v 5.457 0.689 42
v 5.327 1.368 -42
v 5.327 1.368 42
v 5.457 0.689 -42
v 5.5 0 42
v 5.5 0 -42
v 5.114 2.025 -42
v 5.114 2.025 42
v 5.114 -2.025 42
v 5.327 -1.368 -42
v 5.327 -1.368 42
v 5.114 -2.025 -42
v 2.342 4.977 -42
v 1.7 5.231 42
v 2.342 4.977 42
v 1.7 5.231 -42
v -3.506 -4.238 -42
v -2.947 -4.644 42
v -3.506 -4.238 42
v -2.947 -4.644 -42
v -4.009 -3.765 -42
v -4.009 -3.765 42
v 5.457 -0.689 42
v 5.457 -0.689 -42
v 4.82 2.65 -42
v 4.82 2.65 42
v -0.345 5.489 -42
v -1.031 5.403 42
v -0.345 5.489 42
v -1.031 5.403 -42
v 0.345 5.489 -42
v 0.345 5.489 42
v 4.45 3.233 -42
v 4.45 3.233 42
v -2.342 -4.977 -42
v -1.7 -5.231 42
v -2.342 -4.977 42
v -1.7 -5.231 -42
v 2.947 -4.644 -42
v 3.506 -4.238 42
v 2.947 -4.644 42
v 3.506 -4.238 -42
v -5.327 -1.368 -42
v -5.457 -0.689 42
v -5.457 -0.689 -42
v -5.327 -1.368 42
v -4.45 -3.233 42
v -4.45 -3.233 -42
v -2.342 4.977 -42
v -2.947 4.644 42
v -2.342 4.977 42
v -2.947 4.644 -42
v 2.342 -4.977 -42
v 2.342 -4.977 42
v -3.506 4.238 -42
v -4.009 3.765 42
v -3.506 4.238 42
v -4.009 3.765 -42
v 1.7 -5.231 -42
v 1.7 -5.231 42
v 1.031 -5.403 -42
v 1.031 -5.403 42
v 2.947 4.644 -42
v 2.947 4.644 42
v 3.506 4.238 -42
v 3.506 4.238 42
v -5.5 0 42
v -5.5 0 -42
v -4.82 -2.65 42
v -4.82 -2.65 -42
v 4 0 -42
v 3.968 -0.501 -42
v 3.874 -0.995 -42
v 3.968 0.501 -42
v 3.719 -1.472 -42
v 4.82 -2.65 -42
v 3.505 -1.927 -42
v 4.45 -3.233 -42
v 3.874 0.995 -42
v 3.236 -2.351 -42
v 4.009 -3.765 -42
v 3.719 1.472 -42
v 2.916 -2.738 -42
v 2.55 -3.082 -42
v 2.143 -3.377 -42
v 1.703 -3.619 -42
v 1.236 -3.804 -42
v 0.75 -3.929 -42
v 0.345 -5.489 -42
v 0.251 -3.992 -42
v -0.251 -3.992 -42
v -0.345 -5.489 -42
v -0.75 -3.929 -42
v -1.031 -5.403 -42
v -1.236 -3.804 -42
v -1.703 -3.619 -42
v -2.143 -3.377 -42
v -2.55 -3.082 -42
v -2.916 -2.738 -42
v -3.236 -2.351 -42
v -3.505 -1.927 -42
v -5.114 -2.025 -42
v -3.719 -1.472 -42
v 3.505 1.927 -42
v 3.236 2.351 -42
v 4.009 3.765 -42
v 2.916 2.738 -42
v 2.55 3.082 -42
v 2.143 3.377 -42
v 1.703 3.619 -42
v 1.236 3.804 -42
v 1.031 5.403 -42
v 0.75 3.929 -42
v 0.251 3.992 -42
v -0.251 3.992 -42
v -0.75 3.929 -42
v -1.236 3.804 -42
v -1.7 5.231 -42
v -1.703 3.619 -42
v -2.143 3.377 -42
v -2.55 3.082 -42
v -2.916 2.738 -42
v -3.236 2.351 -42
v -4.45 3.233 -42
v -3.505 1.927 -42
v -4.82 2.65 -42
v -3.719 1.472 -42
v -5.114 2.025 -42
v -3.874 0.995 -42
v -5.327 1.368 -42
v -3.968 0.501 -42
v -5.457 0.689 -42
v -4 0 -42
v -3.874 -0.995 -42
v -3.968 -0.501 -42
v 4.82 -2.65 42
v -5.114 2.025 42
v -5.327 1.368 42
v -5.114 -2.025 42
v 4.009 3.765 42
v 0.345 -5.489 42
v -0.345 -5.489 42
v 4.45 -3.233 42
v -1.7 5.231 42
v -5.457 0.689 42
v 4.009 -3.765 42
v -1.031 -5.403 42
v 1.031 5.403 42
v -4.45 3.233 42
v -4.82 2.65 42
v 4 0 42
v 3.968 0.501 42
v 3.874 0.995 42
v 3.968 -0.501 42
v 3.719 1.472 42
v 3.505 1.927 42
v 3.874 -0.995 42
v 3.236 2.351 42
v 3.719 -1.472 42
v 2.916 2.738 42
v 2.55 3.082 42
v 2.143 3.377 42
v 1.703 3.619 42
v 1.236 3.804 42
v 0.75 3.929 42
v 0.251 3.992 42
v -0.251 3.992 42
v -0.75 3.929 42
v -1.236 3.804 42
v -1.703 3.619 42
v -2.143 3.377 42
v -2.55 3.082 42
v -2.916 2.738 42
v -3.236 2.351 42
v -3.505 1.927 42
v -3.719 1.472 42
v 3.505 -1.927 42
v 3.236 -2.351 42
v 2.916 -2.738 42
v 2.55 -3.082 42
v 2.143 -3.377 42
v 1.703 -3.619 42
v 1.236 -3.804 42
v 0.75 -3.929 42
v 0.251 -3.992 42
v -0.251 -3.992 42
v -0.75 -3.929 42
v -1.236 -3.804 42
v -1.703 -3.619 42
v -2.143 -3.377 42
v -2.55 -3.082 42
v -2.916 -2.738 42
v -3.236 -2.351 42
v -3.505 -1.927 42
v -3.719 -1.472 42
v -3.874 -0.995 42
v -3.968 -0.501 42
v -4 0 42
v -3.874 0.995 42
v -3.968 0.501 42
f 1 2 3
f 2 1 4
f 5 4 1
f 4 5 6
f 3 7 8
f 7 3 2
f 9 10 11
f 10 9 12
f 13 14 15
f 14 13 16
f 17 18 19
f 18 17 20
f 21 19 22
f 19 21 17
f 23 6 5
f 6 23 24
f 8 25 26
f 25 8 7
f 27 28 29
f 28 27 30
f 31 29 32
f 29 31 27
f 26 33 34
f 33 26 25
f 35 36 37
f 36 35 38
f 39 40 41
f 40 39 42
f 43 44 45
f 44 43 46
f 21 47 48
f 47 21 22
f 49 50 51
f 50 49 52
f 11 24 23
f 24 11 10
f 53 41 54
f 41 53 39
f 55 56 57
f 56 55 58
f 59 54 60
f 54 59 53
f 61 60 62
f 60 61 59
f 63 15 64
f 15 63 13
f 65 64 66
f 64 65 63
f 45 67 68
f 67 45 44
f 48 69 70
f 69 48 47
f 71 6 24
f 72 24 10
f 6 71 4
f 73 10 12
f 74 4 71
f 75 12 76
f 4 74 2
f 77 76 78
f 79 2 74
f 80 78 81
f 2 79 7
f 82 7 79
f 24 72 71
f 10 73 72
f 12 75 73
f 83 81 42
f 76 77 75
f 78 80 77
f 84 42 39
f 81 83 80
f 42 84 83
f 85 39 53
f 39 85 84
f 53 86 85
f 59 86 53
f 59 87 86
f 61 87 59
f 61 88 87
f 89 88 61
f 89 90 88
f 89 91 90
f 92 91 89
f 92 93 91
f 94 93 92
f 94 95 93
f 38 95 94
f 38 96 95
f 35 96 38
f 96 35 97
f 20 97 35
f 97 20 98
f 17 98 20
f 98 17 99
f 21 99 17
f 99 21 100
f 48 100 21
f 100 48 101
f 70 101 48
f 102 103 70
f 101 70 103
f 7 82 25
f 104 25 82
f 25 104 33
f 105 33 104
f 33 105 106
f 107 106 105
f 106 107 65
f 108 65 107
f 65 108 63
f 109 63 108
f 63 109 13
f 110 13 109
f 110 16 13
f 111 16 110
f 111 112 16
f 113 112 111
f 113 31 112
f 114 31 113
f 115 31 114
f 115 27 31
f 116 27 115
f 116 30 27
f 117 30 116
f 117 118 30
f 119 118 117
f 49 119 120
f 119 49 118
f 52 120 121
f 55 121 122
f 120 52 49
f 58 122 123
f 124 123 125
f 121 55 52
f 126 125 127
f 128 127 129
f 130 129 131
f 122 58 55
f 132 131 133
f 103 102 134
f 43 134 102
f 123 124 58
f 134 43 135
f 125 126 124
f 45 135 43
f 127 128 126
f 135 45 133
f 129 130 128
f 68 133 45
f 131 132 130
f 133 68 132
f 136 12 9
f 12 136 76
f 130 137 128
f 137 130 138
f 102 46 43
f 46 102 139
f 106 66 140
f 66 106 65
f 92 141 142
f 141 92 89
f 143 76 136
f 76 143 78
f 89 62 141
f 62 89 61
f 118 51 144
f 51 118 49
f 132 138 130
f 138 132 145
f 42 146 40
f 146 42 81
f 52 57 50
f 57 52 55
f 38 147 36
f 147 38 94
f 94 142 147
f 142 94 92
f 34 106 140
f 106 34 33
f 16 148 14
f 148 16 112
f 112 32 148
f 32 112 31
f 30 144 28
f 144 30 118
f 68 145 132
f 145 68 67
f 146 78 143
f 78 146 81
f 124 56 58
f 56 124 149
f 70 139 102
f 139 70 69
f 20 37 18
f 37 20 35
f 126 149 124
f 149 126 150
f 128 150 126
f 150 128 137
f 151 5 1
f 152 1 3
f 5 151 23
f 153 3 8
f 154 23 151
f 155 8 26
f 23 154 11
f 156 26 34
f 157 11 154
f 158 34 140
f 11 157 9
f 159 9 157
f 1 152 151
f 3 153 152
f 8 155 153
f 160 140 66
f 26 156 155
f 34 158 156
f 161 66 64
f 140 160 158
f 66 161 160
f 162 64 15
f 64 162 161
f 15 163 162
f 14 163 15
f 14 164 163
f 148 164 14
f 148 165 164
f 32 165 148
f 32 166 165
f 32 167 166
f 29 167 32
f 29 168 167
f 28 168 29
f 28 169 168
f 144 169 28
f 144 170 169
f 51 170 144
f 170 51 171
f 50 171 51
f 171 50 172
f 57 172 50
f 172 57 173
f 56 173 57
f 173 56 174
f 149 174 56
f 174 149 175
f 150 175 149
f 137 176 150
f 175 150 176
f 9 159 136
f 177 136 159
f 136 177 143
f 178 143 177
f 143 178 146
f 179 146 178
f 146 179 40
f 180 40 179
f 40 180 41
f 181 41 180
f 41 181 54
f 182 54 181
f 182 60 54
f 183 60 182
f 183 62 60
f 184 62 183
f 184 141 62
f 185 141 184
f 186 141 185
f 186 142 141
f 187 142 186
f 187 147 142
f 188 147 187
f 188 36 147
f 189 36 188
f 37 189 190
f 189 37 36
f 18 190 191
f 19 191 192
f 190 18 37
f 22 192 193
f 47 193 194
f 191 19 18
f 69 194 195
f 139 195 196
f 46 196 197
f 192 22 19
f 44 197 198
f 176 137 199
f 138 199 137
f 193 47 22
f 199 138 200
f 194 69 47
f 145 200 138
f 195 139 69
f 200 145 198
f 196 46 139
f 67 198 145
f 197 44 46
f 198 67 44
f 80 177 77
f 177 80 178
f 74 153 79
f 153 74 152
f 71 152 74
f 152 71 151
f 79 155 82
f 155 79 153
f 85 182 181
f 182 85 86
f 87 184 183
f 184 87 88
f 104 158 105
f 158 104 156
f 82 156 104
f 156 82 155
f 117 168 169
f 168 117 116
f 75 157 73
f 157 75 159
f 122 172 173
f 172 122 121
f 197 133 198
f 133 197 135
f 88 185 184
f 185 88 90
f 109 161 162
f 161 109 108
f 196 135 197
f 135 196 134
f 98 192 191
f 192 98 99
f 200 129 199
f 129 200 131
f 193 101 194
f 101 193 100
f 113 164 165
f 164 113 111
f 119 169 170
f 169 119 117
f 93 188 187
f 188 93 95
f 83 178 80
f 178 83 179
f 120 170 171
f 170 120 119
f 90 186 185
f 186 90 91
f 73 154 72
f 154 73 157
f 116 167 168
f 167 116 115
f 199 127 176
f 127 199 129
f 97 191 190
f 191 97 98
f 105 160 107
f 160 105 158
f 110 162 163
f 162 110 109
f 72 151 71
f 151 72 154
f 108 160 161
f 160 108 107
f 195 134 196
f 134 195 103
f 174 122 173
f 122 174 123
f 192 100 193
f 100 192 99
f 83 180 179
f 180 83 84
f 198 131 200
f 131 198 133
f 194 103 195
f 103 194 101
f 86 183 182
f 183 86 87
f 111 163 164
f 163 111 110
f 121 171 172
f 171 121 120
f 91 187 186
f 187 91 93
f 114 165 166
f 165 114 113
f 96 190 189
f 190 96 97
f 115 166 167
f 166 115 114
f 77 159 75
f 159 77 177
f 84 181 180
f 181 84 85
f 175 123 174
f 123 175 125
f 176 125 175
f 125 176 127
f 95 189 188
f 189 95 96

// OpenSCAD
$fn = 50;


difference() {
	union() {
		translate(v = [0, 0, -42.0000000000]) {
			cylinder(h = 84, r = 5.5000000000);
		}
	}
	union() {
		translate(v = [0, 0, -100.0000000000]) {
			cylinder(h = 200, r = 4.0000000000);
		}
	}
}
